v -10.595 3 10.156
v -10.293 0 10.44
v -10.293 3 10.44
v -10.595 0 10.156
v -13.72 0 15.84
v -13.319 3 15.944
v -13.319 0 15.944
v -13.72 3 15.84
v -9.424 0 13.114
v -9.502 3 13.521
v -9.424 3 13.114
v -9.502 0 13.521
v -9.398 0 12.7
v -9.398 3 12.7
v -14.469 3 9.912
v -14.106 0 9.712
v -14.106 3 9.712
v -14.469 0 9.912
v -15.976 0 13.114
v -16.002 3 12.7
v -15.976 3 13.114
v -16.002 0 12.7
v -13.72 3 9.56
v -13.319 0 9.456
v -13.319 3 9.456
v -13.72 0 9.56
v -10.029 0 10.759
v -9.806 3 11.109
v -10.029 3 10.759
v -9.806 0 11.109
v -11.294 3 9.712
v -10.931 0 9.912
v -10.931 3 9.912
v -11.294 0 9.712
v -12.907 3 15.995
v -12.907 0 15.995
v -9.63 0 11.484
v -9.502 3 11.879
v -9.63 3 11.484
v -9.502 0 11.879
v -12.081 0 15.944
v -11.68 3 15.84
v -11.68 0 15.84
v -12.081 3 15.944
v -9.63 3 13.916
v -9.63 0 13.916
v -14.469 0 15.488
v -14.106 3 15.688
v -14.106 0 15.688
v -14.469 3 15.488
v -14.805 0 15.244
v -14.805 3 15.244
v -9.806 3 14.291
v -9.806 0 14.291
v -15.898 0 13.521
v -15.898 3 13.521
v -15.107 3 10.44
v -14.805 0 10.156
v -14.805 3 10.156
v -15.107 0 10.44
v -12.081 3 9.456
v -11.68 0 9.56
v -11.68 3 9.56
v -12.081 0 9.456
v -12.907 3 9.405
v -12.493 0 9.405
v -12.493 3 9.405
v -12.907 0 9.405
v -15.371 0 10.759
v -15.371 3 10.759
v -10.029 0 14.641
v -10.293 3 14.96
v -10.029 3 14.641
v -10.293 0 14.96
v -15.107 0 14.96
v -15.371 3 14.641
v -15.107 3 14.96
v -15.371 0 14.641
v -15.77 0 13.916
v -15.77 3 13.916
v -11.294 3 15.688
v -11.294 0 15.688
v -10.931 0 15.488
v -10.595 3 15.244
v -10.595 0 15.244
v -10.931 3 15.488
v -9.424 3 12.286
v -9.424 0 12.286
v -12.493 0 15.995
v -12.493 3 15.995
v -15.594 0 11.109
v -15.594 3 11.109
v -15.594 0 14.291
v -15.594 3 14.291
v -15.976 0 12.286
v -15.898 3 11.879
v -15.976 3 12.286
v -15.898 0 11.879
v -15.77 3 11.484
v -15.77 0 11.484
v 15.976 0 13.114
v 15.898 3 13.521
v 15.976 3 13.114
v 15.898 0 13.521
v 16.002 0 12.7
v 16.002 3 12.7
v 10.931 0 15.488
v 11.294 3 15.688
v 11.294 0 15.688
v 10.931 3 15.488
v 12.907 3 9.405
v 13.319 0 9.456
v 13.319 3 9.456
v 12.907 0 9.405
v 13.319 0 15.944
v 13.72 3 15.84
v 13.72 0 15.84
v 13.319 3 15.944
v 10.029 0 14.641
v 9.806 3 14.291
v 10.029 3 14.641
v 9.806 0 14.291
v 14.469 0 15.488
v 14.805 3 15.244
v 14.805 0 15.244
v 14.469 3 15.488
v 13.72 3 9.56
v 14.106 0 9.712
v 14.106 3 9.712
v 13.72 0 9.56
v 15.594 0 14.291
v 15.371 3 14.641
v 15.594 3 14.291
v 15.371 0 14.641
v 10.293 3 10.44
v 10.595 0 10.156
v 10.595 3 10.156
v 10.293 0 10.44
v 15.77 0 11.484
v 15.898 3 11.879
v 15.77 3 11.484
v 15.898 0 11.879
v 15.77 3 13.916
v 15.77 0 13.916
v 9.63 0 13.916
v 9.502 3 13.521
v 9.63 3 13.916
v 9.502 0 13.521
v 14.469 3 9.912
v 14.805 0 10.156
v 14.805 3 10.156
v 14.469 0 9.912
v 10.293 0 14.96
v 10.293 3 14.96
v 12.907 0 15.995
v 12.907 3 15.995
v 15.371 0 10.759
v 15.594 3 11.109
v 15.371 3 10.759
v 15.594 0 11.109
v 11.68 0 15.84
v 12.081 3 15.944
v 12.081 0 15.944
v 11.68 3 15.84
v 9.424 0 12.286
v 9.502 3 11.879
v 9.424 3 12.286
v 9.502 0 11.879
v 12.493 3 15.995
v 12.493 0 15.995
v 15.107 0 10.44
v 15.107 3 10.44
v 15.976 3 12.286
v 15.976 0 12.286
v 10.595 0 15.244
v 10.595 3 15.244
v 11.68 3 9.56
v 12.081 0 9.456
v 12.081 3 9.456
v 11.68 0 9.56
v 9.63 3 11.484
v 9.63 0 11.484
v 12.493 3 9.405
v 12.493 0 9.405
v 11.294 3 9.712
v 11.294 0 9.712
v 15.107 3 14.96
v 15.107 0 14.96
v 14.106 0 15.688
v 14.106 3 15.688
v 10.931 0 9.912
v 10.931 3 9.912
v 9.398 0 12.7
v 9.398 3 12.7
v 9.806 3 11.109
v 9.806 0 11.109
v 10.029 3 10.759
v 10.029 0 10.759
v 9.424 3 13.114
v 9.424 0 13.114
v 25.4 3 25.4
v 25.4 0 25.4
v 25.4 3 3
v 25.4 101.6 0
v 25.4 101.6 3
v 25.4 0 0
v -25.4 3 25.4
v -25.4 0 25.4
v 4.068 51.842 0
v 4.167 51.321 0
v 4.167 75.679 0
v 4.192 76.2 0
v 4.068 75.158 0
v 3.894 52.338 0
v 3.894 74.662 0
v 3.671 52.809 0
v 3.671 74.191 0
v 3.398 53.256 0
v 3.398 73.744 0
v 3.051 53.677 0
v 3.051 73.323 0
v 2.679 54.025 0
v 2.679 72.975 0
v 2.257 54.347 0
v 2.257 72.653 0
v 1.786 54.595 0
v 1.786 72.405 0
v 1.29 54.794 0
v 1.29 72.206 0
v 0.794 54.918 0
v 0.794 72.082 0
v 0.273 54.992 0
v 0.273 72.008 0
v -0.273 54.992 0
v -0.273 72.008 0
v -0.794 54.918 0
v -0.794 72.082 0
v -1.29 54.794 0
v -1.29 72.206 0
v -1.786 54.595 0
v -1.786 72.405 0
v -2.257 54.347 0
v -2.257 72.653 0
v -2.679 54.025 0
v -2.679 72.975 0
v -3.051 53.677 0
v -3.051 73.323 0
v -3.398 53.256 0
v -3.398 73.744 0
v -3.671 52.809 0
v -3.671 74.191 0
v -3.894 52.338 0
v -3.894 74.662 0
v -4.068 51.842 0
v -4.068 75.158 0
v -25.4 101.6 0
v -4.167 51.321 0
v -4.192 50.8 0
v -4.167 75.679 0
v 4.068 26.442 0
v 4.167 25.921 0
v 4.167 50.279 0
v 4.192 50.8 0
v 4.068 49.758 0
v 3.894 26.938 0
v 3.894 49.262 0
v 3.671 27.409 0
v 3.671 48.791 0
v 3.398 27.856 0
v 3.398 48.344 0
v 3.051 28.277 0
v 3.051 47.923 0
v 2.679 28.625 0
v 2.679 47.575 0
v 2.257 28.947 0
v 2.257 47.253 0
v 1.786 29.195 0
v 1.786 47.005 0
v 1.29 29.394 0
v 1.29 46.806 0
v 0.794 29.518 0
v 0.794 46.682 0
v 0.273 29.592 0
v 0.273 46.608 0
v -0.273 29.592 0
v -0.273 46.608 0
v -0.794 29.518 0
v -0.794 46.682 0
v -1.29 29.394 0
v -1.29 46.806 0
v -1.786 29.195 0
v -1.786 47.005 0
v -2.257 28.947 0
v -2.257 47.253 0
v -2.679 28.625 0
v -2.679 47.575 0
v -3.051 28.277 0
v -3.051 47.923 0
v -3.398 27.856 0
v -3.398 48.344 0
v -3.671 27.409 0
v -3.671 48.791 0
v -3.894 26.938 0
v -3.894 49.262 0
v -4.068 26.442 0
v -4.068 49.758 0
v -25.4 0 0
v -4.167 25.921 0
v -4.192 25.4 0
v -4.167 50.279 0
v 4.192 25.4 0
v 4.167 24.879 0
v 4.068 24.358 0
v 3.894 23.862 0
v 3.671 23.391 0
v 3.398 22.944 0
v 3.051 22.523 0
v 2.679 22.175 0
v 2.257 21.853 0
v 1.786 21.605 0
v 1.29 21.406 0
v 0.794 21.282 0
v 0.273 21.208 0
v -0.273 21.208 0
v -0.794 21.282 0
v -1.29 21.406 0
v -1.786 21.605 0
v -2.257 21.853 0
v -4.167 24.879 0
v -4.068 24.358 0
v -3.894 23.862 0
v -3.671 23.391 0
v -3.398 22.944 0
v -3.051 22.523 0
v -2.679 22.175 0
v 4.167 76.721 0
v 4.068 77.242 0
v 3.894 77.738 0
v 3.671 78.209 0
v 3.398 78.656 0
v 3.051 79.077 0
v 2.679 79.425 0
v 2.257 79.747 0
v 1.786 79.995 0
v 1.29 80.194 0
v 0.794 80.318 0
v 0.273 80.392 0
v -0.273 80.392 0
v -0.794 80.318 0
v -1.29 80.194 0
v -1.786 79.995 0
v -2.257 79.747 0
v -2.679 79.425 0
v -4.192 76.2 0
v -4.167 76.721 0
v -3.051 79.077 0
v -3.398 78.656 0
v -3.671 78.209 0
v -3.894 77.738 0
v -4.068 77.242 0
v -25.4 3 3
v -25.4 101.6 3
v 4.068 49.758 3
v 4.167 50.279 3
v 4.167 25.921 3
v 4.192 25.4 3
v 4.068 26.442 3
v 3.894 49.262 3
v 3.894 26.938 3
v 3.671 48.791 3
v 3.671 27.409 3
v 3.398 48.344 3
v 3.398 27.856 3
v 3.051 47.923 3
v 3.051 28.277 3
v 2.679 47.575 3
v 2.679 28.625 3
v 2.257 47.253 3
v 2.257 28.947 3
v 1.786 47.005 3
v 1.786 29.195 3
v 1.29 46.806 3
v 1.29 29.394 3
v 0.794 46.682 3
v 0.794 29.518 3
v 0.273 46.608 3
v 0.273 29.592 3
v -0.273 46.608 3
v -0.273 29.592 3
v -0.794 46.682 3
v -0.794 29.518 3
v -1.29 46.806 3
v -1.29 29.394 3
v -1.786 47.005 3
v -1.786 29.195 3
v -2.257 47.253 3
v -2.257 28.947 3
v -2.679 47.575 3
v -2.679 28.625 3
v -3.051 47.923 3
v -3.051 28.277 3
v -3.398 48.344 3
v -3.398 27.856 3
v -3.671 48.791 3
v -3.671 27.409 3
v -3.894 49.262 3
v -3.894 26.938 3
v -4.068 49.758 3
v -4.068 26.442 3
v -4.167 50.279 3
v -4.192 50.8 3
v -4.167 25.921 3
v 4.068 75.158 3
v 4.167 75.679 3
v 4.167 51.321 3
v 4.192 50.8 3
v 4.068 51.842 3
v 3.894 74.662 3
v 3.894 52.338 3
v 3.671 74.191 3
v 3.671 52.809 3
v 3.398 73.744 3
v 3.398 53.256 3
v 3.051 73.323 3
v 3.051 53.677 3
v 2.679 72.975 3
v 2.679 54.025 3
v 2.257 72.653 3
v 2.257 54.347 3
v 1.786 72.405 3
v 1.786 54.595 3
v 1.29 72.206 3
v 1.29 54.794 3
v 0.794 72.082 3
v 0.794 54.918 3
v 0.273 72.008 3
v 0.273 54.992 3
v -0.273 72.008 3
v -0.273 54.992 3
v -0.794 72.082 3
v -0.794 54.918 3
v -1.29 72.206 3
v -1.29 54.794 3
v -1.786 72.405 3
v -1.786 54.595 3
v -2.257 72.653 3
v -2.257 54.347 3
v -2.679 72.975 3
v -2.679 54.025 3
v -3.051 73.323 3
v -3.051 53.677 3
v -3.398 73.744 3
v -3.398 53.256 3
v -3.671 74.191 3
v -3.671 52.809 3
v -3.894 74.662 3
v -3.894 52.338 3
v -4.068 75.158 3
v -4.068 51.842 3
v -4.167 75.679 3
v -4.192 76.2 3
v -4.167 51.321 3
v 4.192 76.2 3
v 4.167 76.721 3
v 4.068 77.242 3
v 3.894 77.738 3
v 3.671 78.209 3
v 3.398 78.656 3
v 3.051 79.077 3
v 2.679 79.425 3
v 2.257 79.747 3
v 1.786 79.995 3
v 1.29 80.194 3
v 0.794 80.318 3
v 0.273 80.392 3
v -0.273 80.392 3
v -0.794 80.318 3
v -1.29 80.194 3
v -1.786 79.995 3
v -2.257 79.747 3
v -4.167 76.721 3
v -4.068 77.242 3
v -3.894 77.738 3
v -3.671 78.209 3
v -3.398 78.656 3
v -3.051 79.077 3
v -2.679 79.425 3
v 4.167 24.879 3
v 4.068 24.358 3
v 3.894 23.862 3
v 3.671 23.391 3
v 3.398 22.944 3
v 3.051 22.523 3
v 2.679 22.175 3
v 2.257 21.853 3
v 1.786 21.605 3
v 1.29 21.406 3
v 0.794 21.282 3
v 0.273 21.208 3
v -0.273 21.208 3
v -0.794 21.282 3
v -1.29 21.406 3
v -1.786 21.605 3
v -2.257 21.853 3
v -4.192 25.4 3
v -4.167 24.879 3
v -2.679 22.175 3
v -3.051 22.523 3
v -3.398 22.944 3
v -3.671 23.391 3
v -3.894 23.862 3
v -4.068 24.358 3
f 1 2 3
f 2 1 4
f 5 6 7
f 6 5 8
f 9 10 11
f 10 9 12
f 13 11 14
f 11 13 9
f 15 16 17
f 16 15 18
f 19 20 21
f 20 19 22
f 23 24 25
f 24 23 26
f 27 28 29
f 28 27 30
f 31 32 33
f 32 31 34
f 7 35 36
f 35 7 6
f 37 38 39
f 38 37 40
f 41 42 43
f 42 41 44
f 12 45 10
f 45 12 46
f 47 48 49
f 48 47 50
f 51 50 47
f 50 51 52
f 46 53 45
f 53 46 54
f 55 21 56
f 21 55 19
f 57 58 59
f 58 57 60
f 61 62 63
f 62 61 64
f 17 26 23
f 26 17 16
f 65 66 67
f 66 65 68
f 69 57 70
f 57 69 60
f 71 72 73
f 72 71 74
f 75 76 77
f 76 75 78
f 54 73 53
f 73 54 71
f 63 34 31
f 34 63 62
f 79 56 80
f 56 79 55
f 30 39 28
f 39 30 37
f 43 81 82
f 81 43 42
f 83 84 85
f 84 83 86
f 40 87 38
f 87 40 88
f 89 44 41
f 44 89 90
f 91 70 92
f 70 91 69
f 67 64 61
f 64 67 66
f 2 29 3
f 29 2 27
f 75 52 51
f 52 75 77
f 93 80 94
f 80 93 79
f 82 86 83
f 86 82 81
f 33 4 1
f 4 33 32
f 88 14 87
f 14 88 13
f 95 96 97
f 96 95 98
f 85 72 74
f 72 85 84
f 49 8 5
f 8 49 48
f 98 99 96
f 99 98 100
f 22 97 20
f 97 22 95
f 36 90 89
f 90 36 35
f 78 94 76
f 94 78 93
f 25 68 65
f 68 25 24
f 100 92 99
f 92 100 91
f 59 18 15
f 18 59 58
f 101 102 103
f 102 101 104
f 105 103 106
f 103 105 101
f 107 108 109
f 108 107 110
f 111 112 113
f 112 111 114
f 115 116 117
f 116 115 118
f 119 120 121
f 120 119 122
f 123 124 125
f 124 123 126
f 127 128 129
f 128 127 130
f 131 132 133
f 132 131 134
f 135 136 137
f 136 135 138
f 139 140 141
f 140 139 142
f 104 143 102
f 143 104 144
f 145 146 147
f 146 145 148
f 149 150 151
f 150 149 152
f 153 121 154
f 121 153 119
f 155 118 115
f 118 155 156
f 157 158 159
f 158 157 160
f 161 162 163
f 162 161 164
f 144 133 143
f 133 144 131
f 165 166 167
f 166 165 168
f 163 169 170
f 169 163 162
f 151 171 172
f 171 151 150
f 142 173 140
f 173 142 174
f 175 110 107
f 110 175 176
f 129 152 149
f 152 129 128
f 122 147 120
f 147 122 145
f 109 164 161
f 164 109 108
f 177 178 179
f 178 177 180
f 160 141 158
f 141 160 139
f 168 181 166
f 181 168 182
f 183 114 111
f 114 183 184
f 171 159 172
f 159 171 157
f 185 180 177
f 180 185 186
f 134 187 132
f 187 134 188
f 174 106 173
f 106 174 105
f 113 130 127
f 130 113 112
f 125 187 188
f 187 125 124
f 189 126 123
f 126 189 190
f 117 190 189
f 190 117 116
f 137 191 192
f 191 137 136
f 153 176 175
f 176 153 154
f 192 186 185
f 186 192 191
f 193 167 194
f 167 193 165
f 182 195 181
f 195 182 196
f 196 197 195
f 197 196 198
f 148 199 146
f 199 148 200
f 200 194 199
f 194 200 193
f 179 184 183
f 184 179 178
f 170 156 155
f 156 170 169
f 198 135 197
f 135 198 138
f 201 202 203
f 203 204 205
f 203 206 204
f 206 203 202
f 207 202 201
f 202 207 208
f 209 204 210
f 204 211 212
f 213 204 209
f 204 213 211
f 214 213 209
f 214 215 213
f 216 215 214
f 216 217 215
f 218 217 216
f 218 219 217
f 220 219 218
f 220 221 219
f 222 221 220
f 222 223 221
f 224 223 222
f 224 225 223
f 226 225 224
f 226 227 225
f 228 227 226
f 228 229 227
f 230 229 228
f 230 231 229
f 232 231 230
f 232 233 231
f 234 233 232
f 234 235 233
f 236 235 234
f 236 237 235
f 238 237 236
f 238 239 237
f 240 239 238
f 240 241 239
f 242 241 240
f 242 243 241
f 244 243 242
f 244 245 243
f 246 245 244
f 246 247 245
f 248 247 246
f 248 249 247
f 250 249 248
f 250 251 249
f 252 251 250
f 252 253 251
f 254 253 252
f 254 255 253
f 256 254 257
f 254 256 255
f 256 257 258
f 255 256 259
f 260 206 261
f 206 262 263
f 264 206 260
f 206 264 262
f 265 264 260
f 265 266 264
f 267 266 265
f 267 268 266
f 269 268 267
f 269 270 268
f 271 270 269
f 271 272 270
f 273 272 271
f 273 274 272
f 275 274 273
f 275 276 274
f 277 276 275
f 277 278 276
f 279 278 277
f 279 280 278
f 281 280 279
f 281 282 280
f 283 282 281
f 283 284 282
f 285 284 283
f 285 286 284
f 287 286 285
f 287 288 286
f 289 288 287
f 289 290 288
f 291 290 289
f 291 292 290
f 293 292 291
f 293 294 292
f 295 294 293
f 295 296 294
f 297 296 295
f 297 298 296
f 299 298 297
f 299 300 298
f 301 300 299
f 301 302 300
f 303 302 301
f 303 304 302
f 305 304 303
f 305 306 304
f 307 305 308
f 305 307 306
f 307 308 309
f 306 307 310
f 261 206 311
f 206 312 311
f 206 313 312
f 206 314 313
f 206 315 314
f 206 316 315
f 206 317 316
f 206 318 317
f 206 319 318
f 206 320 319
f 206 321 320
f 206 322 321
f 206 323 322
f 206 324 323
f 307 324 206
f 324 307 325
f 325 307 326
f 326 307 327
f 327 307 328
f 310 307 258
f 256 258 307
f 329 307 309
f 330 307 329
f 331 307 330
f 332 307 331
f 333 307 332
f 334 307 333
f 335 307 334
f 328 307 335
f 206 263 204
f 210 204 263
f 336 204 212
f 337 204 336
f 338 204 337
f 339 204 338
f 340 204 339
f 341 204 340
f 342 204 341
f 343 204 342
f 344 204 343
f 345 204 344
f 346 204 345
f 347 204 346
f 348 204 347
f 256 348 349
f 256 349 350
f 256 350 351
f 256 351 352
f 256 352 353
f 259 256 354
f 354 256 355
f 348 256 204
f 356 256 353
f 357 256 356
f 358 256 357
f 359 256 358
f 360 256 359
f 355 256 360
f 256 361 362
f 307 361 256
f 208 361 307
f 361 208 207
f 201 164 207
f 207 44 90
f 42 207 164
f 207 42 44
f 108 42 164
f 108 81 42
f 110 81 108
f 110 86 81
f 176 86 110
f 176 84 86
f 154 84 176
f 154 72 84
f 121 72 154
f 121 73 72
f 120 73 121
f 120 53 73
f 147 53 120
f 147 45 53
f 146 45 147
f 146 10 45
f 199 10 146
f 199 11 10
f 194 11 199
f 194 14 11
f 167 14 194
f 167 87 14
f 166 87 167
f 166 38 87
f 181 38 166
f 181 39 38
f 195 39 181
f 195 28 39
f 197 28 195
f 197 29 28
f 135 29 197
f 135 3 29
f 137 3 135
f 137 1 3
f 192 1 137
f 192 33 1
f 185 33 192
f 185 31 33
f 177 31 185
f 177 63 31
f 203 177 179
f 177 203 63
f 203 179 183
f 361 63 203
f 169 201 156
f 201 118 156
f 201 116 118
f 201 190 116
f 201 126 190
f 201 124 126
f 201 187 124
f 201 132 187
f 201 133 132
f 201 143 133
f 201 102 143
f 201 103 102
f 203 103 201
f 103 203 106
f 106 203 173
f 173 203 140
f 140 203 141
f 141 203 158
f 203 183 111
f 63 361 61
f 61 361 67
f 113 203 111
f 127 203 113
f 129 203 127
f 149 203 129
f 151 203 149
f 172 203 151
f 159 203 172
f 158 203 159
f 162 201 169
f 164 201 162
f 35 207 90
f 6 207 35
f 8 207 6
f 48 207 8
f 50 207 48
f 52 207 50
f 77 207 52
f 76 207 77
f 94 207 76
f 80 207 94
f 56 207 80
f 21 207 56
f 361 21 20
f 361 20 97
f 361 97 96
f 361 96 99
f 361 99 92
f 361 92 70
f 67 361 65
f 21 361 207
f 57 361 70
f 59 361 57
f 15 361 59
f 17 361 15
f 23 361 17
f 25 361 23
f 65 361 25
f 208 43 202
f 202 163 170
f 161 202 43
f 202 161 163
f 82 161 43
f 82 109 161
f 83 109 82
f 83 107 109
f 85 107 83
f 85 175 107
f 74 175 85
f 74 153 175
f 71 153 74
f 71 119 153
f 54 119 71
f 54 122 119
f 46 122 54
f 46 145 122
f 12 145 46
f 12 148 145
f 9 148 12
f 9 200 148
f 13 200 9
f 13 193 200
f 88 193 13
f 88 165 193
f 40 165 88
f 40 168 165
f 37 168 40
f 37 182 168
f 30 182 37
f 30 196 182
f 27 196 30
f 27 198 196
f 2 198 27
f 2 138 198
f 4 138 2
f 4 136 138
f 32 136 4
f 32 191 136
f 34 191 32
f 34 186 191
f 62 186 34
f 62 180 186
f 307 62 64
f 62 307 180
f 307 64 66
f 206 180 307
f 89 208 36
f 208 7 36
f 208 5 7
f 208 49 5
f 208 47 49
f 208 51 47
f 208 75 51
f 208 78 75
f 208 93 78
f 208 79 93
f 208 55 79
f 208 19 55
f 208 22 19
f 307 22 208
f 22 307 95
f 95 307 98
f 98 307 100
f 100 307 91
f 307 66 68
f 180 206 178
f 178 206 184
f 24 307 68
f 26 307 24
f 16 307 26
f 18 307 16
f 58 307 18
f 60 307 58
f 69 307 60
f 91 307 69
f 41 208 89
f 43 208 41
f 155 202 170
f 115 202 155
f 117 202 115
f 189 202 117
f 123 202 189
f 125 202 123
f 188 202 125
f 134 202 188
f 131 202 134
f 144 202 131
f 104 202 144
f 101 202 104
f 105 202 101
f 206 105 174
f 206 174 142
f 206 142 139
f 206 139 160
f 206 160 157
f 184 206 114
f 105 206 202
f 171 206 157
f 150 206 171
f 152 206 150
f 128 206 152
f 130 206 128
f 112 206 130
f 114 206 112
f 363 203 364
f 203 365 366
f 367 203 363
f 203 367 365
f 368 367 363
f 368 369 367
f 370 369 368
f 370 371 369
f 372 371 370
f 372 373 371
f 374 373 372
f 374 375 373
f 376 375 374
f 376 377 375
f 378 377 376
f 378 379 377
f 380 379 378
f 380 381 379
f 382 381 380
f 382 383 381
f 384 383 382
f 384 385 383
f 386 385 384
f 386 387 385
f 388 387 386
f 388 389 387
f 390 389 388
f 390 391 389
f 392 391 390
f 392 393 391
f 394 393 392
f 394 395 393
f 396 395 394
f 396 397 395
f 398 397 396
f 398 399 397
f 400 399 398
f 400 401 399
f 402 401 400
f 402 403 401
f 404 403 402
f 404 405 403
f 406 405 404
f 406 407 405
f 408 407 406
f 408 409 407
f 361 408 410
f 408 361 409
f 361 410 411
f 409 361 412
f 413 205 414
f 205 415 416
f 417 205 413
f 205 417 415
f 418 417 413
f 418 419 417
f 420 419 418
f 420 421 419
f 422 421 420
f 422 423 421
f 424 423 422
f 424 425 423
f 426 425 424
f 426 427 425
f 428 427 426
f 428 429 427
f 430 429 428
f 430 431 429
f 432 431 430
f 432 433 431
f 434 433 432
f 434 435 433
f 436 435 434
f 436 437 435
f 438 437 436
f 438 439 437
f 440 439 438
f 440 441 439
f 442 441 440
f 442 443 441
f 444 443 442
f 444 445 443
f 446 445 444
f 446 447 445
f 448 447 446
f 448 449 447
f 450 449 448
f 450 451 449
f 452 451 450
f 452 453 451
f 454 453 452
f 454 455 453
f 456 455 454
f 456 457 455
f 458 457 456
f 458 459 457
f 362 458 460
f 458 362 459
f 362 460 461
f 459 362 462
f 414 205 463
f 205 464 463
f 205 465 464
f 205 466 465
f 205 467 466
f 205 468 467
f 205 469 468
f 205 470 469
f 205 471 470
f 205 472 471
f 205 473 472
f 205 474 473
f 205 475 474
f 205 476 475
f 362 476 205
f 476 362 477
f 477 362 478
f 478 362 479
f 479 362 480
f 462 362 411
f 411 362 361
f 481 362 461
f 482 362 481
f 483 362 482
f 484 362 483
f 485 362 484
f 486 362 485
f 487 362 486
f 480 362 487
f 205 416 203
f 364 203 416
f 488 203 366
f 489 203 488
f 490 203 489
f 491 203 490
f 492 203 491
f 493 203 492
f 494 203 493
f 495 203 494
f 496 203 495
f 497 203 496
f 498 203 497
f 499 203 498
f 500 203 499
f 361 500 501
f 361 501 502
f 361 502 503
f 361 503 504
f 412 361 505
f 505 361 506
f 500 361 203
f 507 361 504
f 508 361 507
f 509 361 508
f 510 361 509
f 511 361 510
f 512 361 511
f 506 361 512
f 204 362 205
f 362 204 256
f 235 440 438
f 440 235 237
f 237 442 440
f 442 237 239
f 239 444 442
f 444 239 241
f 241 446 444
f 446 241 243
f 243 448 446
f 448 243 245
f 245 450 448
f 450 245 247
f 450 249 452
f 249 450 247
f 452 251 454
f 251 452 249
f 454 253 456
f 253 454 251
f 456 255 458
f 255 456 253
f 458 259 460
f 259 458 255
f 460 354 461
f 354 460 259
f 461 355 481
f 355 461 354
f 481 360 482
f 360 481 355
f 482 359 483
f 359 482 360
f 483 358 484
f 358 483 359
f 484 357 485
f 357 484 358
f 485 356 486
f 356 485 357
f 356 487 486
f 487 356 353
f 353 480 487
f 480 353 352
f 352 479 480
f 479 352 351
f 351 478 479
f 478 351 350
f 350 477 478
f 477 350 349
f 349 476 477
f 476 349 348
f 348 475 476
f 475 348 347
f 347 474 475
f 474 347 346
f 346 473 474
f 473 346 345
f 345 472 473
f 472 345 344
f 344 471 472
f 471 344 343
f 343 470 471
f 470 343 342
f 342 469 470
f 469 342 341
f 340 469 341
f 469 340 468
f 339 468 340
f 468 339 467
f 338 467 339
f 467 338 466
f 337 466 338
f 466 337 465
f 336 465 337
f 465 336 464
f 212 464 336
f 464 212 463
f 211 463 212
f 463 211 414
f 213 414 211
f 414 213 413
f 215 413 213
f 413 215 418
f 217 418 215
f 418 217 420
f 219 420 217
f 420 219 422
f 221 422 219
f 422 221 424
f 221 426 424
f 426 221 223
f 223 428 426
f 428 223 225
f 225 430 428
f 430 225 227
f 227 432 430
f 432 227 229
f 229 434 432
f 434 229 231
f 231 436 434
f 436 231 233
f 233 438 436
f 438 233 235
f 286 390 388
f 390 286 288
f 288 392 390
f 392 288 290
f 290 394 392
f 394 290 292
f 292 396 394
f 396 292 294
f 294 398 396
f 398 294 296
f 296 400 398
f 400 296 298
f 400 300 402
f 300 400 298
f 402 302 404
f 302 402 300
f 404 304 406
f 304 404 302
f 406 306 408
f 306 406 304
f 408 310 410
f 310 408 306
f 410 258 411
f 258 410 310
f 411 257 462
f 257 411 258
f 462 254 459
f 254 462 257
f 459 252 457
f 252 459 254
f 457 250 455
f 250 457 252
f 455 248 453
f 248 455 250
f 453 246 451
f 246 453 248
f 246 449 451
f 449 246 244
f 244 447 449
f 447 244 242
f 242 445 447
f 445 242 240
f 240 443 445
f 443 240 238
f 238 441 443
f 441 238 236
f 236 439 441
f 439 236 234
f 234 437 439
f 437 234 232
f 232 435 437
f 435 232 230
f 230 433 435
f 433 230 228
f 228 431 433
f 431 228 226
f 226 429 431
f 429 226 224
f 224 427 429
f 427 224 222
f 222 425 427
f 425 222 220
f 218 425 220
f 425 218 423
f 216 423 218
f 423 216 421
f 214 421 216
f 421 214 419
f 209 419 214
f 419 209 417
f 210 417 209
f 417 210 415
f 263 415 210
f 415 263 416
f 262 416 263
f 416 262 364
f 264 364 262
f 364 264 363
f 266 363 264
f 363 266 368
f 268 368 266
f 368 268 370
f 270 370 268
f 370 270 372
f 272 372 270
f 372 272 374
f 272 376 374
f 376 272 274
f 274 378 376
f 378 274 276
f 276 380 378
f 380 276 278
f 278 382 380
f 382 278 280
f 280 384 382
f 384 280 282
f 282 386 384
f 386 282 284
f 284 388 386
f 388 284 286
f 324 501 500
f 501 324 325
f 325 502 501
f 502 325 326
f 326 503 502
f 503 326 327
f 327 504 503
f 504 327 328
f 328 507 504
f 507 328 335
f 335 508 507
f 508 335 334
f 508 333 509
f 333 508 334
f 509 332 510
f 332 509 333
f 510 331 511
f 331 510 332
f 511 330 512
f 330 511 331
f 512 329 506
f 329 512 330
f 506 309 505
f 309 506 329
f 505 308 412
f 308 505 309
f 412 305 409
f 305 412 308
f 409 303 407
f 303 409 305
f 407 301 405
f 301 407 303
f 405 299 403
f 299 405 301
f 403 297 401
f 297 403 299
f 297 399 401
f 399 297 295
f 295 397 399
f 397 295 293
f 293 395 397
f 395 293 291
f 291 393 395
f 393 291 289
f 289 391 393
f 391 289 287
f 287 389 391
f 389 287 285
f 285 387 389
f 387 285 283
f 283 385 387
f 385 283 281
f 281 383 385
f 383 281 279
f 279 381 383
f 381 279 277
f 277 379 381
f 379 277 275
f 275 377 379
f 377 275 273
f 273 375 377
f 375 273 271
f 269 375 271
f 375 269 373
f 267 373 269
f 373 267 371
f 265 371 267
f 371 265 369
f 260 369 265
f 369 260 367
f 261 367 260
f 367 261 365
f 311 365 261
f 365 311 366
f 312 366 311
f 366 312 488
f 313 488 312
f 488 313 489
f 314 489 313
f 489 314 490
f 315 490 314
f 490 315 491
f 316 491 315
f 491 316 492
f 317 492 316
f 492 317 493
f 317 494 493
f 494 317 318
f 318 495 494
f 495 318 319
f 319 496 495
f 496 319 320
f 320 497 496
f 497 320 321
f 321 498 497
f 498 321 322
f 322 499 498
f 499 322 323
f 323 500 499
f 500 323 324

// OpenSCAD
$fn=50;
inch = 25.4;

linear_extrude(3)
scale([inch, inch, 0]) 
import("./switchcraft.dxf");

difference() {

translate([-1*inch, 0, 0]) 
cube([2*inch, 3, 1*inch]);

union() {
   
translate([-0.5*inch, 0, 0.5*inch])
rotate([90, 0, 0])
cylinder(10, 0.13*inch, 0.13*inch, center=true);

translate([0.5*inch, 0, 0.5*inch])
rotate([90, 0, 0])
cylinder(10, 0.13*inch, 0.13*inch, center=true);

}
}
